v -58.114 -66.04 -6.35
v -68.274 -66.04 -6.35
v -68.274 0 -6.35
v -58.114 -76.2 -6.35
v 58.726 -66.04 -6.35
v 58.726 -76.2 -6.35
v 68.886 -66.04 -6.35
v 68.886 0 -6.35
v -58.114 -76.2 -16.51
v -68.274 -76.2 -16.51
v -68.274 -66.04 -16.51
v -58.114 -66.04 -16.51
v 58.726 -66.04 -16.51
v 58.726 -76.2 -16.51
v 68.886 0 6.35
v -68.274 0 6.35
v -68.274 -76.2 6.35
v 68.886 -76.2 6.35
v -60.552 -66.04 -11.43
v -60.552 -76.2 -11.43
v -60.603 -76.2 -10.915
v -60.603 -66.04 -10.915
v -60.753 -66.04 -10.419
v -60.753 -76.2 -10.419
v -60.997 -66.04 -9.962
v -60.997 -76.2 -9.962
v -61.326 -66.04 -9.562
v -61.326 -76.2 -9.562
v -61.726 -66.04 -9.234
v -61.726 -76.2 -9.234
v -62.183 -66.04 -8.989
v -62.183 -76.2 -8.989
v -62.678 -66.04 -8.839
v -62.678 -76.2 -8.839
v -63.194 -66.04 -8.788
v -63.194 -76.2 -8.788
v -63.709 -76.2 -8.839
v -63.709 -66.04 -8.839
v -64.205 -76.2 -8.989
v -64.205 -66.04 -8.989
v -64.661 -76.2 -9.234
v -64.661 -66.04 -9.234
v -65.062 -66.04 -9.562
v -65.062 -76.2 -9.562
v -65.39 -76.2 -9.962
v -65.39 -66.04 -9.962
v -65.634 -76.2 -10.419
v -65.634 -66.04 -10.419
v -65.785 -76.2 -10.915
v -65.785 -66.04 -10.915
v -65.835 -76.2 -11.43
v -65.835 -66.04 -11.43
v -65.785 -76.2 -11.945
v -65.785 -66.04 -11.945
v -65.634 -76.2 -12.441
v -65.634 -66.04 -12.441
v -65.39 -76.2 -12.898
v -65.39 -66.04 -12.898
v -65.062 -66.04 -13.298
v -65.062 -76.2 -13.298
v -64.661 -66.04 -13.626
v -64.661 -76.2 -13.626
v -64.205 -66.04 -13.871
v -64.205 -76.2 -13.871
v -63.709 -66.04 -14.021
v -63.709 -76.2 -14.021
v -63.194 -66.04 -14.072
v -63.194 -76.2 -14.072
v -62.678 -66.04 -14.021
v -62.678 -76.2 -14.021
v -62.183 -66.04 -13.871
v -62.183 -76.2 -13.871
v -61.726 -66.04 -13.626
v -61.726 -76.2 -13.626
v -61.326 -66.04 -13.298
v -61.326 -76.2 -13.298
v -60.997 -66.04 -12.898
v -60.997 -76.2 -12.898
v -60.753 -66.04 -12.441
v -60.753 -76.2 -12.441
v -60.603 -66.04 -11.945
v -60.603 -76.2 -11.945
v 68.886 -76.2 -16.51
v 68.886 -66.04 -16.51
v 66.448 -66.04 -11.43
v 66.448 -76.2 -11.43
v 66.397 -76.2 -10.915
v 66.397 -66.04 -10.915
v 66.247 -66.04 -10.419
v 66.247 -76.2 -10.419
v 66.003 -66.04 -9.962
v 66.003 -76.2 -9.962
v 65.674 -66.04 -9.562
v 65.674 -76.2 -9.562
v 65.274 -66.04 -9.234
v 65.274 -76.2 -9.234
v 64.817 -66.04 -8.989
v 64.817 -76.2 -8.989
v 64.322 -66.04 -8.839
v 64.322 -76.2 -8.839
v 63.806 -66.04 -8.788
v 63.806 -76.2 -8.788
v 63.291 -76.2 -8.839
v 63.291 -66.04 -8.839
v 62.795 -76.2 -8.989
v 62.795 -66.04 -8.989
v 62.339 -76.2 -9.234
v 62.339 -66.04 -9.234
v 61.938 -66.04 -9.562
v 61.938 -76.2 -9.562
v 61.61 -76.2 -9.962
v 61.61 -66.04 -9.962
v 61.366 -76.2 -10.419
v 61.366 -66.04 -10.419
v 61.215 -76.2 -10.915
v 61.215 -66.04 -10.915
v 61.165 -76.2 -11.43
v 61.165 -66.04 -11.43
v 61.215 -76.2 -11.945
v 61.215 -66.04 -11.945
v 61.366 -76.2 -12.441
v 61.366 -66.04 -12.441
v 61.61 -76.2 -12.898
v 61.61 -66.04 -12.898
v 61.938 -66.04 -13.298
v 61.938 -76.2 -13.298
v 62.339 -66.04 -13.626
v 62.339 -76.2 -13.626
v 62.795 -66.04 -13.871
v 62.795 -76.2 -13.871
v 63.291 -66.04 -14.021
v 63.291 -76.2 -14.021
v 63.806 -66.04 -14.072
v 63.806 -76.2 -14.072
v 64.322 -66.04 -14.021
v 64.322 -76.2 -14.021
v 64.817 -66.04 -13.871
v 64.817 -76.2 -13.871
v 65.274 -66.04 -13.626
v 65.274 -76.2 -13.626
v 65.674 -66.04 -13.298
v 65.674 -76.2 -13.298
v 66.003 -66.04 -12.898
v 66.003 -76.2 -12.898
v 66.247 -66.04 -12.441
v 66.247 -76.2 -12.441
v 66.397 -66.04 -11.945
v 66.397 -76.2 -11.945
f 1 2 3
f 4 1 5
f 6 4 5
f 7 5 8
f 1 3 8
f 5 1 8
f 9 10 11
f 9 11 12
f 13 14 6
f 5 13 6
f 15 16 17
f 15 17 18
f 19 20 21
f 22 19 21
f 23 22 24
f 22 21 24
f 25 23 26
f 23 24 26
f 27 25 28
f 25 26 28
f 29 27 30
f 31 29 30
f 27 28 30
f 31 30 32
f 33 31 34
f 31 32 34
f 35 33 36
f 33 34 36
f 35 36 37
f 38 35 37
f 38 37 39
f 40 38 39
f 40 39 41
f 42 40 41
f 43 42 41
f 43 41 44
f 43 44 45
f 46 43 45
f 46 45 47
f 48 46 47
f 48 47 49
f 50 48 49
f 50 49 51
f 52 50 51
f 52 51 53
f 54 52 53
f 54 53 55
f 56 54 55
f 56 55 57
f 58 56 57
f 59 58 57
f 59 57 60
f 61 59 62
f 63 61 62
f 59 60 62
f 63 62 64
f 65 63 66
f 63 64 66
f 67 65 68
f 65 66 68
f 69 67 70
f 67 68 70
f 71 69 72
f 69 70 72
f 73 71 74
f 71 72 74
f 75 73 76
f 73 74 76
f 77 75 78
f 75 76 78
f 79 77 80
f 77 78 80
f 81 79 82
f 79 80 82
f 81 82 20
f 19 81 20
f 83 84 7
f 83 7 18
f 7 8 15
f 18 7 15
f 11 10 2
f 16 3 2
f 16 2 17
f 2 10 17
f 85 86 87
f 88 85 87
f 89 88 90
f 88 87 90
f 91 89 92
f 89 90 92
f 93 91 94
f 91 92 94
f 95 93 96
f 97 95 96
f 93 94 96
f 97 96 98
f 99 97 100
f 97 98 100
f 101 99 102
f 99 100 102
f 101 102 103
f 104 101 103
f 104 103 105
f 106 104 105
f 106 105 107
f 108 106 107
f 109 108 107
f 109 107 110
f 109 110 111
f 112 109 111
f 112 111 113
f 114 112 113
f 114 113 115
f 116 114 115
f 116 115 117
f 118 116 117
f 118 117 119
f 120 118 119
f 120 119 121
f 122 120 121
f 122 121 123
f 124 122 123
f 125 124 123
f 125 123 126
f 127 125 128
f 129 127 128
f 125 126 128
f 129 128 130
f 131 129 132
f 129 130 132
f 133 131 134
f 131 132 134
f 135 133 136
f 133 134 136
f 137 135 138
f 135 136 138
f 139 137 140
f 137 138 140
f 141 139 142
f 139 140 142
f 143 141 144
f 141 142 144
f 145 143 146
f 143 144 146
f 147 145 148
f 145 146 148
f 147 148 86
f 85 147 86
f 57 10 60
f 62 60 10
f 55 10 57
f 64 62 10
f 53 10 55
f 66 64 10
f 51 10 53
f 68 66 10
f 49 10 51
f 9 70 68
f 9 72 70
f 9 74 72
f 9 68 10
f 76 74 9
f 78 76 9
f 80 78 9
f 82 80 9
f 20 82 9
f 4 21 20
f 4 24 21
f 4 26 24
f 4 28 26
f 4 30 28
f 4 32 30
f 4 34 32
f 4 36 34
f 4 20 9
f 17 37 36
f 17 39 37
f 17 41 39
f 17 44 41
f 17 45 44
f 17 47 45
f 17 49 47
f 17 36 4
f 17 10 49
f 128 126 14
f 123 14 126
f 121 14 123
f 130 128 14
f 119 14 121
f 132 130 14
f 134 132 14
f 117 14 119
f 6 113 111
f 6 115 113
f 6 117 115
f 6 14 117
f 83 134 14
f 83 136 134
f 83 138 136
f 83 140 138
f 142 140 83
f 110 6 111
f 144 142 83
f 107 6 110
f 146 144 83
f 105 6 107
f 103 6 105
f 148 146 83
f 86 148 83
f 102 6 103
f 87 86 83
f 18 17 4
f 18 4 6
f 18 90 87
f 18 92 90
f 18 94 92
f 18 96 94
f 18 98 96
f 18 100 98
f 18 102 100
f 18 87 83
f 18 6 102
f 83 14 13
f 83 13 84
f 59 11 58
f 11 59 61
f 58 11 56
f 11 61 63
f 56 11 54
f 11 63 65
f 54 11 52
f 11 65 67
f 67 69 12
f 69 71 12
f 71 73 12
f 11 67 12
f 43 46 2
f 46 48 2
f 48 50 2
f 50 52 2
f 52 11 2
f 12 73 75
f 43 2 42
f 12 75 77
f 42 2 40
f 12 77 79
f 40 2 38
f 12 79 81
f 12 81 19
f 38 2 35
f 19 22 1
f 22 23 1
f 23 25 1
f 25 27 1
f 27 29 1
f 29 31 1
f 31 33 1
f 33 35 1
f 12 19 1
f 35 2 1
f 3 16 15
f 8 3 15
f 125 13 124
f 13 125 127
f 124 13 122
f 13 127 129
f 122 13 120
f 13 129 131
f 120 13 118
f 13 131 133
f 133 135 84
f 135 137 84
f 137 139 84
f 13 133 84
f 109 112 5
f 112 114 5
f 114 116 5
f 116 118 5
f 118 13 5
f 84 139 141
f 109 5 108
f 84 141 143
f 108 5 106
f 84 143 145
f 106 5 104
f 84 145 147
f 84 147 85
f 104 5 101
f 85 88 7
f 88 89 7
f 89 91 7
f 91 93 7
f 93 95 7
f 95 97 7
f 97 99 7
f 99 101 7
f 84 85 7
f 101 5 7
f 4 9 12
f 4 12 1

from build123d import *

# Parameters (mm, degrees)
F0_W     = 137.16
F0_H     = 12.7
F1_DEPTH = 76.2
F2_W     = 10.16
F2_H     = 10.16
F3_DEPTH = 10.16
F4_R     = 2.6416
F5_DEPTH = 25.4


with BuildPart() as f1:
    # F0 (on Front) → F1 (new body)
    with BuildSketch(Plane.XZ):
        with Locations((0.306241, 0)):
            Rectangle(F0_W, F0_H)
    extrude(amount=F1_DEPTH)

    # F2 (on face) → F3 (join)
    with BuildSketch(Plane.XZ.offset(76.2)):
        with Locations((-63.193759, -11.43)):
            Rectangle(F2_W, F2_H)
        with Locations((63.806241, -11.43)):
            Rectangle(F2_W, F2_H)
    extrude(amount=-F3_DEPTH)

    # F4 (on face) → F5 (cut)
    with BuildSketch(Plane.XZ.offset(76.2)):
        with Locations((-63.193759, -11.43)):
            Circle(F4_R)
        with Locations((63.806241, -11.43)):
            Circle(F4_R)
    extrude(amount=-F5_DEPTH, mode=Mode.SUBTRACT)


solid = f1.part
